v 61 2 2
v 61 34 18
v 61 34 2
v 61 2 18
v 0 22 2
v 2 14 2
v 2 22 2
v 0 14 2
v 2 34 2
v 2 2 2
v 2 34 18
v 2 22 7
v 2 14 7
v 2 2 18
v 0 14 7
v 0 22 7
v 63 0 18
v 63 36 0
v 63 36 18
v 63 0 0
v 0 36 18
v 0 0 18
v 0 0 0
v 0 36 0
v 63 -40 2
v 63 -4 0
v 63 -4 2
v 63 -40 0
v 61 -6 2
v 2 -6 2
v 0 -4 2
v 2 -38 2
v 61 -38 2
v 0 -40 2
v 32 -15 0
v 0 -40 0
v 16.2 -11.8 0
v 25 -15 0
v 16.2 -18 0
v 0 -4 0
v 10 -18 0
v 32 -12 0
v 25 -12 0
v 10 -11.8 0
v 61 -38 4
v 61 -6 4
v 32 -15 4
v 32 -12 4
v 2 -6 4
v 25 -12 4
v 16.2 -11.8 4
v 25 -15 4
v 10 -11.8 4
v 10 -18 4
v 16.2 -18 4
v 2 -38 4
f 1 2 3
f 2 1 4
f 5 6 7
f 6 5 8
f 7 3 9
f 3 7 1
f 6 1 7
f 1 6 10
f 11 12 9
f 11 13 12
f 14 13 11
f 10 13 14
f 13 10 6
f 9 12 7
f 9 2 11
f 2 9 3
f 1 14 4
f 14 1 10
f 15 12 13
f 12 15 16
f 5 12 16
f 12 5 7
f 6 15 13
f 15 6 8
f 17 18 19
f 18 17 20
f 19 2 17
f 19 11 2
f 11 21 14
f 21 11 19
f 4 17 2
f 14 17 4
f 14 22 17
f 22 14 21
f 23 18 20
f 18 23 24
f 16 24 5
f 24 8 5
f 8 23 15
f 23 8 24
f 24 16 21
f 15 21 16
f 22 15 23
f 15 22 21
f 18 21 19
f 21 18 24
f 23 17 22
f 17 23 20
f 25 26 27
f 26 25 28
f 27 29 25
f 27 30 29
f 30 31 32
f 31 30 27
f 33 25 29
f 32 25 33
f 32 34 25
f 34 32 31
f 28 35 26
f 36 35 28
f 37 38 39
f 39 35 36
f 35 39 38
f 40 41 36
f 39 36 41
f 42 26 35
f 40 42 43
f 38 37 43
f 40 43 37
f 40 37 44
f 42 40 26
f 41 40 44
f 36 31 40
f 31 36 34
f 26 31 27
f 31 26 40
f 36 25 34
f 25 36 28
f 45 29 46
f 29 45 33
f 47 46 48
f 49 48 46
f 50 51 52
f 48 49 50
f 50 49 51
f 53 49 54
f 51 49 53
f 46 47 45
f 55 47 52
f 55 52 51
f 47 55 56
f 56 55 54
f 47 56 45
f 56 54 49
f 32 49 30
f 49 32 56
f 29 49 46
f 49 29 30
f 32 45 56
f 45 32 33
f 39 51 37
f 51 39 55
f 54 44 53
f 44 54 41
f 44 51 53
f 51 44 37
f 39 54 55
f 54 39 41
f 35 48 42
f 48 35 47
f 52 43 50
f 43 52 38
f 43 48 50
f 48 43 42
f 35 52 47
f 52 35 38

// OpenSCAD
wall = 2;
length = 59;
width = 32;
height = 14;
usb_hole = 8;

difference() {
    cube([length + 2*wall, width + 2*wall, height + 2 * wall]);
    union() {        
        translate([wall, wall, wall]) {
            cube([length, width, height+100]);
        }
        translate([-1, wall + width/2 - usb_hole / 2, wall]) {
            cube([10, usb_hole, 5]);
        }
    }
}

translate([0,-40,0]) {
    difference() {
        union() {
            cube([length + wall*2, width + wall*2, wall]);
            translate([wall,wall,wall]) {
                cube([length, width, wall]);
            }
        }
        union() {
            translate([wall*5,width-wall*5,-1]) {
                cube([6.2,6.2,100]);
            }
            translate([25,width-wall-5,-1]) {
                cube([7,3,100]);
            }
        }
    }
}
